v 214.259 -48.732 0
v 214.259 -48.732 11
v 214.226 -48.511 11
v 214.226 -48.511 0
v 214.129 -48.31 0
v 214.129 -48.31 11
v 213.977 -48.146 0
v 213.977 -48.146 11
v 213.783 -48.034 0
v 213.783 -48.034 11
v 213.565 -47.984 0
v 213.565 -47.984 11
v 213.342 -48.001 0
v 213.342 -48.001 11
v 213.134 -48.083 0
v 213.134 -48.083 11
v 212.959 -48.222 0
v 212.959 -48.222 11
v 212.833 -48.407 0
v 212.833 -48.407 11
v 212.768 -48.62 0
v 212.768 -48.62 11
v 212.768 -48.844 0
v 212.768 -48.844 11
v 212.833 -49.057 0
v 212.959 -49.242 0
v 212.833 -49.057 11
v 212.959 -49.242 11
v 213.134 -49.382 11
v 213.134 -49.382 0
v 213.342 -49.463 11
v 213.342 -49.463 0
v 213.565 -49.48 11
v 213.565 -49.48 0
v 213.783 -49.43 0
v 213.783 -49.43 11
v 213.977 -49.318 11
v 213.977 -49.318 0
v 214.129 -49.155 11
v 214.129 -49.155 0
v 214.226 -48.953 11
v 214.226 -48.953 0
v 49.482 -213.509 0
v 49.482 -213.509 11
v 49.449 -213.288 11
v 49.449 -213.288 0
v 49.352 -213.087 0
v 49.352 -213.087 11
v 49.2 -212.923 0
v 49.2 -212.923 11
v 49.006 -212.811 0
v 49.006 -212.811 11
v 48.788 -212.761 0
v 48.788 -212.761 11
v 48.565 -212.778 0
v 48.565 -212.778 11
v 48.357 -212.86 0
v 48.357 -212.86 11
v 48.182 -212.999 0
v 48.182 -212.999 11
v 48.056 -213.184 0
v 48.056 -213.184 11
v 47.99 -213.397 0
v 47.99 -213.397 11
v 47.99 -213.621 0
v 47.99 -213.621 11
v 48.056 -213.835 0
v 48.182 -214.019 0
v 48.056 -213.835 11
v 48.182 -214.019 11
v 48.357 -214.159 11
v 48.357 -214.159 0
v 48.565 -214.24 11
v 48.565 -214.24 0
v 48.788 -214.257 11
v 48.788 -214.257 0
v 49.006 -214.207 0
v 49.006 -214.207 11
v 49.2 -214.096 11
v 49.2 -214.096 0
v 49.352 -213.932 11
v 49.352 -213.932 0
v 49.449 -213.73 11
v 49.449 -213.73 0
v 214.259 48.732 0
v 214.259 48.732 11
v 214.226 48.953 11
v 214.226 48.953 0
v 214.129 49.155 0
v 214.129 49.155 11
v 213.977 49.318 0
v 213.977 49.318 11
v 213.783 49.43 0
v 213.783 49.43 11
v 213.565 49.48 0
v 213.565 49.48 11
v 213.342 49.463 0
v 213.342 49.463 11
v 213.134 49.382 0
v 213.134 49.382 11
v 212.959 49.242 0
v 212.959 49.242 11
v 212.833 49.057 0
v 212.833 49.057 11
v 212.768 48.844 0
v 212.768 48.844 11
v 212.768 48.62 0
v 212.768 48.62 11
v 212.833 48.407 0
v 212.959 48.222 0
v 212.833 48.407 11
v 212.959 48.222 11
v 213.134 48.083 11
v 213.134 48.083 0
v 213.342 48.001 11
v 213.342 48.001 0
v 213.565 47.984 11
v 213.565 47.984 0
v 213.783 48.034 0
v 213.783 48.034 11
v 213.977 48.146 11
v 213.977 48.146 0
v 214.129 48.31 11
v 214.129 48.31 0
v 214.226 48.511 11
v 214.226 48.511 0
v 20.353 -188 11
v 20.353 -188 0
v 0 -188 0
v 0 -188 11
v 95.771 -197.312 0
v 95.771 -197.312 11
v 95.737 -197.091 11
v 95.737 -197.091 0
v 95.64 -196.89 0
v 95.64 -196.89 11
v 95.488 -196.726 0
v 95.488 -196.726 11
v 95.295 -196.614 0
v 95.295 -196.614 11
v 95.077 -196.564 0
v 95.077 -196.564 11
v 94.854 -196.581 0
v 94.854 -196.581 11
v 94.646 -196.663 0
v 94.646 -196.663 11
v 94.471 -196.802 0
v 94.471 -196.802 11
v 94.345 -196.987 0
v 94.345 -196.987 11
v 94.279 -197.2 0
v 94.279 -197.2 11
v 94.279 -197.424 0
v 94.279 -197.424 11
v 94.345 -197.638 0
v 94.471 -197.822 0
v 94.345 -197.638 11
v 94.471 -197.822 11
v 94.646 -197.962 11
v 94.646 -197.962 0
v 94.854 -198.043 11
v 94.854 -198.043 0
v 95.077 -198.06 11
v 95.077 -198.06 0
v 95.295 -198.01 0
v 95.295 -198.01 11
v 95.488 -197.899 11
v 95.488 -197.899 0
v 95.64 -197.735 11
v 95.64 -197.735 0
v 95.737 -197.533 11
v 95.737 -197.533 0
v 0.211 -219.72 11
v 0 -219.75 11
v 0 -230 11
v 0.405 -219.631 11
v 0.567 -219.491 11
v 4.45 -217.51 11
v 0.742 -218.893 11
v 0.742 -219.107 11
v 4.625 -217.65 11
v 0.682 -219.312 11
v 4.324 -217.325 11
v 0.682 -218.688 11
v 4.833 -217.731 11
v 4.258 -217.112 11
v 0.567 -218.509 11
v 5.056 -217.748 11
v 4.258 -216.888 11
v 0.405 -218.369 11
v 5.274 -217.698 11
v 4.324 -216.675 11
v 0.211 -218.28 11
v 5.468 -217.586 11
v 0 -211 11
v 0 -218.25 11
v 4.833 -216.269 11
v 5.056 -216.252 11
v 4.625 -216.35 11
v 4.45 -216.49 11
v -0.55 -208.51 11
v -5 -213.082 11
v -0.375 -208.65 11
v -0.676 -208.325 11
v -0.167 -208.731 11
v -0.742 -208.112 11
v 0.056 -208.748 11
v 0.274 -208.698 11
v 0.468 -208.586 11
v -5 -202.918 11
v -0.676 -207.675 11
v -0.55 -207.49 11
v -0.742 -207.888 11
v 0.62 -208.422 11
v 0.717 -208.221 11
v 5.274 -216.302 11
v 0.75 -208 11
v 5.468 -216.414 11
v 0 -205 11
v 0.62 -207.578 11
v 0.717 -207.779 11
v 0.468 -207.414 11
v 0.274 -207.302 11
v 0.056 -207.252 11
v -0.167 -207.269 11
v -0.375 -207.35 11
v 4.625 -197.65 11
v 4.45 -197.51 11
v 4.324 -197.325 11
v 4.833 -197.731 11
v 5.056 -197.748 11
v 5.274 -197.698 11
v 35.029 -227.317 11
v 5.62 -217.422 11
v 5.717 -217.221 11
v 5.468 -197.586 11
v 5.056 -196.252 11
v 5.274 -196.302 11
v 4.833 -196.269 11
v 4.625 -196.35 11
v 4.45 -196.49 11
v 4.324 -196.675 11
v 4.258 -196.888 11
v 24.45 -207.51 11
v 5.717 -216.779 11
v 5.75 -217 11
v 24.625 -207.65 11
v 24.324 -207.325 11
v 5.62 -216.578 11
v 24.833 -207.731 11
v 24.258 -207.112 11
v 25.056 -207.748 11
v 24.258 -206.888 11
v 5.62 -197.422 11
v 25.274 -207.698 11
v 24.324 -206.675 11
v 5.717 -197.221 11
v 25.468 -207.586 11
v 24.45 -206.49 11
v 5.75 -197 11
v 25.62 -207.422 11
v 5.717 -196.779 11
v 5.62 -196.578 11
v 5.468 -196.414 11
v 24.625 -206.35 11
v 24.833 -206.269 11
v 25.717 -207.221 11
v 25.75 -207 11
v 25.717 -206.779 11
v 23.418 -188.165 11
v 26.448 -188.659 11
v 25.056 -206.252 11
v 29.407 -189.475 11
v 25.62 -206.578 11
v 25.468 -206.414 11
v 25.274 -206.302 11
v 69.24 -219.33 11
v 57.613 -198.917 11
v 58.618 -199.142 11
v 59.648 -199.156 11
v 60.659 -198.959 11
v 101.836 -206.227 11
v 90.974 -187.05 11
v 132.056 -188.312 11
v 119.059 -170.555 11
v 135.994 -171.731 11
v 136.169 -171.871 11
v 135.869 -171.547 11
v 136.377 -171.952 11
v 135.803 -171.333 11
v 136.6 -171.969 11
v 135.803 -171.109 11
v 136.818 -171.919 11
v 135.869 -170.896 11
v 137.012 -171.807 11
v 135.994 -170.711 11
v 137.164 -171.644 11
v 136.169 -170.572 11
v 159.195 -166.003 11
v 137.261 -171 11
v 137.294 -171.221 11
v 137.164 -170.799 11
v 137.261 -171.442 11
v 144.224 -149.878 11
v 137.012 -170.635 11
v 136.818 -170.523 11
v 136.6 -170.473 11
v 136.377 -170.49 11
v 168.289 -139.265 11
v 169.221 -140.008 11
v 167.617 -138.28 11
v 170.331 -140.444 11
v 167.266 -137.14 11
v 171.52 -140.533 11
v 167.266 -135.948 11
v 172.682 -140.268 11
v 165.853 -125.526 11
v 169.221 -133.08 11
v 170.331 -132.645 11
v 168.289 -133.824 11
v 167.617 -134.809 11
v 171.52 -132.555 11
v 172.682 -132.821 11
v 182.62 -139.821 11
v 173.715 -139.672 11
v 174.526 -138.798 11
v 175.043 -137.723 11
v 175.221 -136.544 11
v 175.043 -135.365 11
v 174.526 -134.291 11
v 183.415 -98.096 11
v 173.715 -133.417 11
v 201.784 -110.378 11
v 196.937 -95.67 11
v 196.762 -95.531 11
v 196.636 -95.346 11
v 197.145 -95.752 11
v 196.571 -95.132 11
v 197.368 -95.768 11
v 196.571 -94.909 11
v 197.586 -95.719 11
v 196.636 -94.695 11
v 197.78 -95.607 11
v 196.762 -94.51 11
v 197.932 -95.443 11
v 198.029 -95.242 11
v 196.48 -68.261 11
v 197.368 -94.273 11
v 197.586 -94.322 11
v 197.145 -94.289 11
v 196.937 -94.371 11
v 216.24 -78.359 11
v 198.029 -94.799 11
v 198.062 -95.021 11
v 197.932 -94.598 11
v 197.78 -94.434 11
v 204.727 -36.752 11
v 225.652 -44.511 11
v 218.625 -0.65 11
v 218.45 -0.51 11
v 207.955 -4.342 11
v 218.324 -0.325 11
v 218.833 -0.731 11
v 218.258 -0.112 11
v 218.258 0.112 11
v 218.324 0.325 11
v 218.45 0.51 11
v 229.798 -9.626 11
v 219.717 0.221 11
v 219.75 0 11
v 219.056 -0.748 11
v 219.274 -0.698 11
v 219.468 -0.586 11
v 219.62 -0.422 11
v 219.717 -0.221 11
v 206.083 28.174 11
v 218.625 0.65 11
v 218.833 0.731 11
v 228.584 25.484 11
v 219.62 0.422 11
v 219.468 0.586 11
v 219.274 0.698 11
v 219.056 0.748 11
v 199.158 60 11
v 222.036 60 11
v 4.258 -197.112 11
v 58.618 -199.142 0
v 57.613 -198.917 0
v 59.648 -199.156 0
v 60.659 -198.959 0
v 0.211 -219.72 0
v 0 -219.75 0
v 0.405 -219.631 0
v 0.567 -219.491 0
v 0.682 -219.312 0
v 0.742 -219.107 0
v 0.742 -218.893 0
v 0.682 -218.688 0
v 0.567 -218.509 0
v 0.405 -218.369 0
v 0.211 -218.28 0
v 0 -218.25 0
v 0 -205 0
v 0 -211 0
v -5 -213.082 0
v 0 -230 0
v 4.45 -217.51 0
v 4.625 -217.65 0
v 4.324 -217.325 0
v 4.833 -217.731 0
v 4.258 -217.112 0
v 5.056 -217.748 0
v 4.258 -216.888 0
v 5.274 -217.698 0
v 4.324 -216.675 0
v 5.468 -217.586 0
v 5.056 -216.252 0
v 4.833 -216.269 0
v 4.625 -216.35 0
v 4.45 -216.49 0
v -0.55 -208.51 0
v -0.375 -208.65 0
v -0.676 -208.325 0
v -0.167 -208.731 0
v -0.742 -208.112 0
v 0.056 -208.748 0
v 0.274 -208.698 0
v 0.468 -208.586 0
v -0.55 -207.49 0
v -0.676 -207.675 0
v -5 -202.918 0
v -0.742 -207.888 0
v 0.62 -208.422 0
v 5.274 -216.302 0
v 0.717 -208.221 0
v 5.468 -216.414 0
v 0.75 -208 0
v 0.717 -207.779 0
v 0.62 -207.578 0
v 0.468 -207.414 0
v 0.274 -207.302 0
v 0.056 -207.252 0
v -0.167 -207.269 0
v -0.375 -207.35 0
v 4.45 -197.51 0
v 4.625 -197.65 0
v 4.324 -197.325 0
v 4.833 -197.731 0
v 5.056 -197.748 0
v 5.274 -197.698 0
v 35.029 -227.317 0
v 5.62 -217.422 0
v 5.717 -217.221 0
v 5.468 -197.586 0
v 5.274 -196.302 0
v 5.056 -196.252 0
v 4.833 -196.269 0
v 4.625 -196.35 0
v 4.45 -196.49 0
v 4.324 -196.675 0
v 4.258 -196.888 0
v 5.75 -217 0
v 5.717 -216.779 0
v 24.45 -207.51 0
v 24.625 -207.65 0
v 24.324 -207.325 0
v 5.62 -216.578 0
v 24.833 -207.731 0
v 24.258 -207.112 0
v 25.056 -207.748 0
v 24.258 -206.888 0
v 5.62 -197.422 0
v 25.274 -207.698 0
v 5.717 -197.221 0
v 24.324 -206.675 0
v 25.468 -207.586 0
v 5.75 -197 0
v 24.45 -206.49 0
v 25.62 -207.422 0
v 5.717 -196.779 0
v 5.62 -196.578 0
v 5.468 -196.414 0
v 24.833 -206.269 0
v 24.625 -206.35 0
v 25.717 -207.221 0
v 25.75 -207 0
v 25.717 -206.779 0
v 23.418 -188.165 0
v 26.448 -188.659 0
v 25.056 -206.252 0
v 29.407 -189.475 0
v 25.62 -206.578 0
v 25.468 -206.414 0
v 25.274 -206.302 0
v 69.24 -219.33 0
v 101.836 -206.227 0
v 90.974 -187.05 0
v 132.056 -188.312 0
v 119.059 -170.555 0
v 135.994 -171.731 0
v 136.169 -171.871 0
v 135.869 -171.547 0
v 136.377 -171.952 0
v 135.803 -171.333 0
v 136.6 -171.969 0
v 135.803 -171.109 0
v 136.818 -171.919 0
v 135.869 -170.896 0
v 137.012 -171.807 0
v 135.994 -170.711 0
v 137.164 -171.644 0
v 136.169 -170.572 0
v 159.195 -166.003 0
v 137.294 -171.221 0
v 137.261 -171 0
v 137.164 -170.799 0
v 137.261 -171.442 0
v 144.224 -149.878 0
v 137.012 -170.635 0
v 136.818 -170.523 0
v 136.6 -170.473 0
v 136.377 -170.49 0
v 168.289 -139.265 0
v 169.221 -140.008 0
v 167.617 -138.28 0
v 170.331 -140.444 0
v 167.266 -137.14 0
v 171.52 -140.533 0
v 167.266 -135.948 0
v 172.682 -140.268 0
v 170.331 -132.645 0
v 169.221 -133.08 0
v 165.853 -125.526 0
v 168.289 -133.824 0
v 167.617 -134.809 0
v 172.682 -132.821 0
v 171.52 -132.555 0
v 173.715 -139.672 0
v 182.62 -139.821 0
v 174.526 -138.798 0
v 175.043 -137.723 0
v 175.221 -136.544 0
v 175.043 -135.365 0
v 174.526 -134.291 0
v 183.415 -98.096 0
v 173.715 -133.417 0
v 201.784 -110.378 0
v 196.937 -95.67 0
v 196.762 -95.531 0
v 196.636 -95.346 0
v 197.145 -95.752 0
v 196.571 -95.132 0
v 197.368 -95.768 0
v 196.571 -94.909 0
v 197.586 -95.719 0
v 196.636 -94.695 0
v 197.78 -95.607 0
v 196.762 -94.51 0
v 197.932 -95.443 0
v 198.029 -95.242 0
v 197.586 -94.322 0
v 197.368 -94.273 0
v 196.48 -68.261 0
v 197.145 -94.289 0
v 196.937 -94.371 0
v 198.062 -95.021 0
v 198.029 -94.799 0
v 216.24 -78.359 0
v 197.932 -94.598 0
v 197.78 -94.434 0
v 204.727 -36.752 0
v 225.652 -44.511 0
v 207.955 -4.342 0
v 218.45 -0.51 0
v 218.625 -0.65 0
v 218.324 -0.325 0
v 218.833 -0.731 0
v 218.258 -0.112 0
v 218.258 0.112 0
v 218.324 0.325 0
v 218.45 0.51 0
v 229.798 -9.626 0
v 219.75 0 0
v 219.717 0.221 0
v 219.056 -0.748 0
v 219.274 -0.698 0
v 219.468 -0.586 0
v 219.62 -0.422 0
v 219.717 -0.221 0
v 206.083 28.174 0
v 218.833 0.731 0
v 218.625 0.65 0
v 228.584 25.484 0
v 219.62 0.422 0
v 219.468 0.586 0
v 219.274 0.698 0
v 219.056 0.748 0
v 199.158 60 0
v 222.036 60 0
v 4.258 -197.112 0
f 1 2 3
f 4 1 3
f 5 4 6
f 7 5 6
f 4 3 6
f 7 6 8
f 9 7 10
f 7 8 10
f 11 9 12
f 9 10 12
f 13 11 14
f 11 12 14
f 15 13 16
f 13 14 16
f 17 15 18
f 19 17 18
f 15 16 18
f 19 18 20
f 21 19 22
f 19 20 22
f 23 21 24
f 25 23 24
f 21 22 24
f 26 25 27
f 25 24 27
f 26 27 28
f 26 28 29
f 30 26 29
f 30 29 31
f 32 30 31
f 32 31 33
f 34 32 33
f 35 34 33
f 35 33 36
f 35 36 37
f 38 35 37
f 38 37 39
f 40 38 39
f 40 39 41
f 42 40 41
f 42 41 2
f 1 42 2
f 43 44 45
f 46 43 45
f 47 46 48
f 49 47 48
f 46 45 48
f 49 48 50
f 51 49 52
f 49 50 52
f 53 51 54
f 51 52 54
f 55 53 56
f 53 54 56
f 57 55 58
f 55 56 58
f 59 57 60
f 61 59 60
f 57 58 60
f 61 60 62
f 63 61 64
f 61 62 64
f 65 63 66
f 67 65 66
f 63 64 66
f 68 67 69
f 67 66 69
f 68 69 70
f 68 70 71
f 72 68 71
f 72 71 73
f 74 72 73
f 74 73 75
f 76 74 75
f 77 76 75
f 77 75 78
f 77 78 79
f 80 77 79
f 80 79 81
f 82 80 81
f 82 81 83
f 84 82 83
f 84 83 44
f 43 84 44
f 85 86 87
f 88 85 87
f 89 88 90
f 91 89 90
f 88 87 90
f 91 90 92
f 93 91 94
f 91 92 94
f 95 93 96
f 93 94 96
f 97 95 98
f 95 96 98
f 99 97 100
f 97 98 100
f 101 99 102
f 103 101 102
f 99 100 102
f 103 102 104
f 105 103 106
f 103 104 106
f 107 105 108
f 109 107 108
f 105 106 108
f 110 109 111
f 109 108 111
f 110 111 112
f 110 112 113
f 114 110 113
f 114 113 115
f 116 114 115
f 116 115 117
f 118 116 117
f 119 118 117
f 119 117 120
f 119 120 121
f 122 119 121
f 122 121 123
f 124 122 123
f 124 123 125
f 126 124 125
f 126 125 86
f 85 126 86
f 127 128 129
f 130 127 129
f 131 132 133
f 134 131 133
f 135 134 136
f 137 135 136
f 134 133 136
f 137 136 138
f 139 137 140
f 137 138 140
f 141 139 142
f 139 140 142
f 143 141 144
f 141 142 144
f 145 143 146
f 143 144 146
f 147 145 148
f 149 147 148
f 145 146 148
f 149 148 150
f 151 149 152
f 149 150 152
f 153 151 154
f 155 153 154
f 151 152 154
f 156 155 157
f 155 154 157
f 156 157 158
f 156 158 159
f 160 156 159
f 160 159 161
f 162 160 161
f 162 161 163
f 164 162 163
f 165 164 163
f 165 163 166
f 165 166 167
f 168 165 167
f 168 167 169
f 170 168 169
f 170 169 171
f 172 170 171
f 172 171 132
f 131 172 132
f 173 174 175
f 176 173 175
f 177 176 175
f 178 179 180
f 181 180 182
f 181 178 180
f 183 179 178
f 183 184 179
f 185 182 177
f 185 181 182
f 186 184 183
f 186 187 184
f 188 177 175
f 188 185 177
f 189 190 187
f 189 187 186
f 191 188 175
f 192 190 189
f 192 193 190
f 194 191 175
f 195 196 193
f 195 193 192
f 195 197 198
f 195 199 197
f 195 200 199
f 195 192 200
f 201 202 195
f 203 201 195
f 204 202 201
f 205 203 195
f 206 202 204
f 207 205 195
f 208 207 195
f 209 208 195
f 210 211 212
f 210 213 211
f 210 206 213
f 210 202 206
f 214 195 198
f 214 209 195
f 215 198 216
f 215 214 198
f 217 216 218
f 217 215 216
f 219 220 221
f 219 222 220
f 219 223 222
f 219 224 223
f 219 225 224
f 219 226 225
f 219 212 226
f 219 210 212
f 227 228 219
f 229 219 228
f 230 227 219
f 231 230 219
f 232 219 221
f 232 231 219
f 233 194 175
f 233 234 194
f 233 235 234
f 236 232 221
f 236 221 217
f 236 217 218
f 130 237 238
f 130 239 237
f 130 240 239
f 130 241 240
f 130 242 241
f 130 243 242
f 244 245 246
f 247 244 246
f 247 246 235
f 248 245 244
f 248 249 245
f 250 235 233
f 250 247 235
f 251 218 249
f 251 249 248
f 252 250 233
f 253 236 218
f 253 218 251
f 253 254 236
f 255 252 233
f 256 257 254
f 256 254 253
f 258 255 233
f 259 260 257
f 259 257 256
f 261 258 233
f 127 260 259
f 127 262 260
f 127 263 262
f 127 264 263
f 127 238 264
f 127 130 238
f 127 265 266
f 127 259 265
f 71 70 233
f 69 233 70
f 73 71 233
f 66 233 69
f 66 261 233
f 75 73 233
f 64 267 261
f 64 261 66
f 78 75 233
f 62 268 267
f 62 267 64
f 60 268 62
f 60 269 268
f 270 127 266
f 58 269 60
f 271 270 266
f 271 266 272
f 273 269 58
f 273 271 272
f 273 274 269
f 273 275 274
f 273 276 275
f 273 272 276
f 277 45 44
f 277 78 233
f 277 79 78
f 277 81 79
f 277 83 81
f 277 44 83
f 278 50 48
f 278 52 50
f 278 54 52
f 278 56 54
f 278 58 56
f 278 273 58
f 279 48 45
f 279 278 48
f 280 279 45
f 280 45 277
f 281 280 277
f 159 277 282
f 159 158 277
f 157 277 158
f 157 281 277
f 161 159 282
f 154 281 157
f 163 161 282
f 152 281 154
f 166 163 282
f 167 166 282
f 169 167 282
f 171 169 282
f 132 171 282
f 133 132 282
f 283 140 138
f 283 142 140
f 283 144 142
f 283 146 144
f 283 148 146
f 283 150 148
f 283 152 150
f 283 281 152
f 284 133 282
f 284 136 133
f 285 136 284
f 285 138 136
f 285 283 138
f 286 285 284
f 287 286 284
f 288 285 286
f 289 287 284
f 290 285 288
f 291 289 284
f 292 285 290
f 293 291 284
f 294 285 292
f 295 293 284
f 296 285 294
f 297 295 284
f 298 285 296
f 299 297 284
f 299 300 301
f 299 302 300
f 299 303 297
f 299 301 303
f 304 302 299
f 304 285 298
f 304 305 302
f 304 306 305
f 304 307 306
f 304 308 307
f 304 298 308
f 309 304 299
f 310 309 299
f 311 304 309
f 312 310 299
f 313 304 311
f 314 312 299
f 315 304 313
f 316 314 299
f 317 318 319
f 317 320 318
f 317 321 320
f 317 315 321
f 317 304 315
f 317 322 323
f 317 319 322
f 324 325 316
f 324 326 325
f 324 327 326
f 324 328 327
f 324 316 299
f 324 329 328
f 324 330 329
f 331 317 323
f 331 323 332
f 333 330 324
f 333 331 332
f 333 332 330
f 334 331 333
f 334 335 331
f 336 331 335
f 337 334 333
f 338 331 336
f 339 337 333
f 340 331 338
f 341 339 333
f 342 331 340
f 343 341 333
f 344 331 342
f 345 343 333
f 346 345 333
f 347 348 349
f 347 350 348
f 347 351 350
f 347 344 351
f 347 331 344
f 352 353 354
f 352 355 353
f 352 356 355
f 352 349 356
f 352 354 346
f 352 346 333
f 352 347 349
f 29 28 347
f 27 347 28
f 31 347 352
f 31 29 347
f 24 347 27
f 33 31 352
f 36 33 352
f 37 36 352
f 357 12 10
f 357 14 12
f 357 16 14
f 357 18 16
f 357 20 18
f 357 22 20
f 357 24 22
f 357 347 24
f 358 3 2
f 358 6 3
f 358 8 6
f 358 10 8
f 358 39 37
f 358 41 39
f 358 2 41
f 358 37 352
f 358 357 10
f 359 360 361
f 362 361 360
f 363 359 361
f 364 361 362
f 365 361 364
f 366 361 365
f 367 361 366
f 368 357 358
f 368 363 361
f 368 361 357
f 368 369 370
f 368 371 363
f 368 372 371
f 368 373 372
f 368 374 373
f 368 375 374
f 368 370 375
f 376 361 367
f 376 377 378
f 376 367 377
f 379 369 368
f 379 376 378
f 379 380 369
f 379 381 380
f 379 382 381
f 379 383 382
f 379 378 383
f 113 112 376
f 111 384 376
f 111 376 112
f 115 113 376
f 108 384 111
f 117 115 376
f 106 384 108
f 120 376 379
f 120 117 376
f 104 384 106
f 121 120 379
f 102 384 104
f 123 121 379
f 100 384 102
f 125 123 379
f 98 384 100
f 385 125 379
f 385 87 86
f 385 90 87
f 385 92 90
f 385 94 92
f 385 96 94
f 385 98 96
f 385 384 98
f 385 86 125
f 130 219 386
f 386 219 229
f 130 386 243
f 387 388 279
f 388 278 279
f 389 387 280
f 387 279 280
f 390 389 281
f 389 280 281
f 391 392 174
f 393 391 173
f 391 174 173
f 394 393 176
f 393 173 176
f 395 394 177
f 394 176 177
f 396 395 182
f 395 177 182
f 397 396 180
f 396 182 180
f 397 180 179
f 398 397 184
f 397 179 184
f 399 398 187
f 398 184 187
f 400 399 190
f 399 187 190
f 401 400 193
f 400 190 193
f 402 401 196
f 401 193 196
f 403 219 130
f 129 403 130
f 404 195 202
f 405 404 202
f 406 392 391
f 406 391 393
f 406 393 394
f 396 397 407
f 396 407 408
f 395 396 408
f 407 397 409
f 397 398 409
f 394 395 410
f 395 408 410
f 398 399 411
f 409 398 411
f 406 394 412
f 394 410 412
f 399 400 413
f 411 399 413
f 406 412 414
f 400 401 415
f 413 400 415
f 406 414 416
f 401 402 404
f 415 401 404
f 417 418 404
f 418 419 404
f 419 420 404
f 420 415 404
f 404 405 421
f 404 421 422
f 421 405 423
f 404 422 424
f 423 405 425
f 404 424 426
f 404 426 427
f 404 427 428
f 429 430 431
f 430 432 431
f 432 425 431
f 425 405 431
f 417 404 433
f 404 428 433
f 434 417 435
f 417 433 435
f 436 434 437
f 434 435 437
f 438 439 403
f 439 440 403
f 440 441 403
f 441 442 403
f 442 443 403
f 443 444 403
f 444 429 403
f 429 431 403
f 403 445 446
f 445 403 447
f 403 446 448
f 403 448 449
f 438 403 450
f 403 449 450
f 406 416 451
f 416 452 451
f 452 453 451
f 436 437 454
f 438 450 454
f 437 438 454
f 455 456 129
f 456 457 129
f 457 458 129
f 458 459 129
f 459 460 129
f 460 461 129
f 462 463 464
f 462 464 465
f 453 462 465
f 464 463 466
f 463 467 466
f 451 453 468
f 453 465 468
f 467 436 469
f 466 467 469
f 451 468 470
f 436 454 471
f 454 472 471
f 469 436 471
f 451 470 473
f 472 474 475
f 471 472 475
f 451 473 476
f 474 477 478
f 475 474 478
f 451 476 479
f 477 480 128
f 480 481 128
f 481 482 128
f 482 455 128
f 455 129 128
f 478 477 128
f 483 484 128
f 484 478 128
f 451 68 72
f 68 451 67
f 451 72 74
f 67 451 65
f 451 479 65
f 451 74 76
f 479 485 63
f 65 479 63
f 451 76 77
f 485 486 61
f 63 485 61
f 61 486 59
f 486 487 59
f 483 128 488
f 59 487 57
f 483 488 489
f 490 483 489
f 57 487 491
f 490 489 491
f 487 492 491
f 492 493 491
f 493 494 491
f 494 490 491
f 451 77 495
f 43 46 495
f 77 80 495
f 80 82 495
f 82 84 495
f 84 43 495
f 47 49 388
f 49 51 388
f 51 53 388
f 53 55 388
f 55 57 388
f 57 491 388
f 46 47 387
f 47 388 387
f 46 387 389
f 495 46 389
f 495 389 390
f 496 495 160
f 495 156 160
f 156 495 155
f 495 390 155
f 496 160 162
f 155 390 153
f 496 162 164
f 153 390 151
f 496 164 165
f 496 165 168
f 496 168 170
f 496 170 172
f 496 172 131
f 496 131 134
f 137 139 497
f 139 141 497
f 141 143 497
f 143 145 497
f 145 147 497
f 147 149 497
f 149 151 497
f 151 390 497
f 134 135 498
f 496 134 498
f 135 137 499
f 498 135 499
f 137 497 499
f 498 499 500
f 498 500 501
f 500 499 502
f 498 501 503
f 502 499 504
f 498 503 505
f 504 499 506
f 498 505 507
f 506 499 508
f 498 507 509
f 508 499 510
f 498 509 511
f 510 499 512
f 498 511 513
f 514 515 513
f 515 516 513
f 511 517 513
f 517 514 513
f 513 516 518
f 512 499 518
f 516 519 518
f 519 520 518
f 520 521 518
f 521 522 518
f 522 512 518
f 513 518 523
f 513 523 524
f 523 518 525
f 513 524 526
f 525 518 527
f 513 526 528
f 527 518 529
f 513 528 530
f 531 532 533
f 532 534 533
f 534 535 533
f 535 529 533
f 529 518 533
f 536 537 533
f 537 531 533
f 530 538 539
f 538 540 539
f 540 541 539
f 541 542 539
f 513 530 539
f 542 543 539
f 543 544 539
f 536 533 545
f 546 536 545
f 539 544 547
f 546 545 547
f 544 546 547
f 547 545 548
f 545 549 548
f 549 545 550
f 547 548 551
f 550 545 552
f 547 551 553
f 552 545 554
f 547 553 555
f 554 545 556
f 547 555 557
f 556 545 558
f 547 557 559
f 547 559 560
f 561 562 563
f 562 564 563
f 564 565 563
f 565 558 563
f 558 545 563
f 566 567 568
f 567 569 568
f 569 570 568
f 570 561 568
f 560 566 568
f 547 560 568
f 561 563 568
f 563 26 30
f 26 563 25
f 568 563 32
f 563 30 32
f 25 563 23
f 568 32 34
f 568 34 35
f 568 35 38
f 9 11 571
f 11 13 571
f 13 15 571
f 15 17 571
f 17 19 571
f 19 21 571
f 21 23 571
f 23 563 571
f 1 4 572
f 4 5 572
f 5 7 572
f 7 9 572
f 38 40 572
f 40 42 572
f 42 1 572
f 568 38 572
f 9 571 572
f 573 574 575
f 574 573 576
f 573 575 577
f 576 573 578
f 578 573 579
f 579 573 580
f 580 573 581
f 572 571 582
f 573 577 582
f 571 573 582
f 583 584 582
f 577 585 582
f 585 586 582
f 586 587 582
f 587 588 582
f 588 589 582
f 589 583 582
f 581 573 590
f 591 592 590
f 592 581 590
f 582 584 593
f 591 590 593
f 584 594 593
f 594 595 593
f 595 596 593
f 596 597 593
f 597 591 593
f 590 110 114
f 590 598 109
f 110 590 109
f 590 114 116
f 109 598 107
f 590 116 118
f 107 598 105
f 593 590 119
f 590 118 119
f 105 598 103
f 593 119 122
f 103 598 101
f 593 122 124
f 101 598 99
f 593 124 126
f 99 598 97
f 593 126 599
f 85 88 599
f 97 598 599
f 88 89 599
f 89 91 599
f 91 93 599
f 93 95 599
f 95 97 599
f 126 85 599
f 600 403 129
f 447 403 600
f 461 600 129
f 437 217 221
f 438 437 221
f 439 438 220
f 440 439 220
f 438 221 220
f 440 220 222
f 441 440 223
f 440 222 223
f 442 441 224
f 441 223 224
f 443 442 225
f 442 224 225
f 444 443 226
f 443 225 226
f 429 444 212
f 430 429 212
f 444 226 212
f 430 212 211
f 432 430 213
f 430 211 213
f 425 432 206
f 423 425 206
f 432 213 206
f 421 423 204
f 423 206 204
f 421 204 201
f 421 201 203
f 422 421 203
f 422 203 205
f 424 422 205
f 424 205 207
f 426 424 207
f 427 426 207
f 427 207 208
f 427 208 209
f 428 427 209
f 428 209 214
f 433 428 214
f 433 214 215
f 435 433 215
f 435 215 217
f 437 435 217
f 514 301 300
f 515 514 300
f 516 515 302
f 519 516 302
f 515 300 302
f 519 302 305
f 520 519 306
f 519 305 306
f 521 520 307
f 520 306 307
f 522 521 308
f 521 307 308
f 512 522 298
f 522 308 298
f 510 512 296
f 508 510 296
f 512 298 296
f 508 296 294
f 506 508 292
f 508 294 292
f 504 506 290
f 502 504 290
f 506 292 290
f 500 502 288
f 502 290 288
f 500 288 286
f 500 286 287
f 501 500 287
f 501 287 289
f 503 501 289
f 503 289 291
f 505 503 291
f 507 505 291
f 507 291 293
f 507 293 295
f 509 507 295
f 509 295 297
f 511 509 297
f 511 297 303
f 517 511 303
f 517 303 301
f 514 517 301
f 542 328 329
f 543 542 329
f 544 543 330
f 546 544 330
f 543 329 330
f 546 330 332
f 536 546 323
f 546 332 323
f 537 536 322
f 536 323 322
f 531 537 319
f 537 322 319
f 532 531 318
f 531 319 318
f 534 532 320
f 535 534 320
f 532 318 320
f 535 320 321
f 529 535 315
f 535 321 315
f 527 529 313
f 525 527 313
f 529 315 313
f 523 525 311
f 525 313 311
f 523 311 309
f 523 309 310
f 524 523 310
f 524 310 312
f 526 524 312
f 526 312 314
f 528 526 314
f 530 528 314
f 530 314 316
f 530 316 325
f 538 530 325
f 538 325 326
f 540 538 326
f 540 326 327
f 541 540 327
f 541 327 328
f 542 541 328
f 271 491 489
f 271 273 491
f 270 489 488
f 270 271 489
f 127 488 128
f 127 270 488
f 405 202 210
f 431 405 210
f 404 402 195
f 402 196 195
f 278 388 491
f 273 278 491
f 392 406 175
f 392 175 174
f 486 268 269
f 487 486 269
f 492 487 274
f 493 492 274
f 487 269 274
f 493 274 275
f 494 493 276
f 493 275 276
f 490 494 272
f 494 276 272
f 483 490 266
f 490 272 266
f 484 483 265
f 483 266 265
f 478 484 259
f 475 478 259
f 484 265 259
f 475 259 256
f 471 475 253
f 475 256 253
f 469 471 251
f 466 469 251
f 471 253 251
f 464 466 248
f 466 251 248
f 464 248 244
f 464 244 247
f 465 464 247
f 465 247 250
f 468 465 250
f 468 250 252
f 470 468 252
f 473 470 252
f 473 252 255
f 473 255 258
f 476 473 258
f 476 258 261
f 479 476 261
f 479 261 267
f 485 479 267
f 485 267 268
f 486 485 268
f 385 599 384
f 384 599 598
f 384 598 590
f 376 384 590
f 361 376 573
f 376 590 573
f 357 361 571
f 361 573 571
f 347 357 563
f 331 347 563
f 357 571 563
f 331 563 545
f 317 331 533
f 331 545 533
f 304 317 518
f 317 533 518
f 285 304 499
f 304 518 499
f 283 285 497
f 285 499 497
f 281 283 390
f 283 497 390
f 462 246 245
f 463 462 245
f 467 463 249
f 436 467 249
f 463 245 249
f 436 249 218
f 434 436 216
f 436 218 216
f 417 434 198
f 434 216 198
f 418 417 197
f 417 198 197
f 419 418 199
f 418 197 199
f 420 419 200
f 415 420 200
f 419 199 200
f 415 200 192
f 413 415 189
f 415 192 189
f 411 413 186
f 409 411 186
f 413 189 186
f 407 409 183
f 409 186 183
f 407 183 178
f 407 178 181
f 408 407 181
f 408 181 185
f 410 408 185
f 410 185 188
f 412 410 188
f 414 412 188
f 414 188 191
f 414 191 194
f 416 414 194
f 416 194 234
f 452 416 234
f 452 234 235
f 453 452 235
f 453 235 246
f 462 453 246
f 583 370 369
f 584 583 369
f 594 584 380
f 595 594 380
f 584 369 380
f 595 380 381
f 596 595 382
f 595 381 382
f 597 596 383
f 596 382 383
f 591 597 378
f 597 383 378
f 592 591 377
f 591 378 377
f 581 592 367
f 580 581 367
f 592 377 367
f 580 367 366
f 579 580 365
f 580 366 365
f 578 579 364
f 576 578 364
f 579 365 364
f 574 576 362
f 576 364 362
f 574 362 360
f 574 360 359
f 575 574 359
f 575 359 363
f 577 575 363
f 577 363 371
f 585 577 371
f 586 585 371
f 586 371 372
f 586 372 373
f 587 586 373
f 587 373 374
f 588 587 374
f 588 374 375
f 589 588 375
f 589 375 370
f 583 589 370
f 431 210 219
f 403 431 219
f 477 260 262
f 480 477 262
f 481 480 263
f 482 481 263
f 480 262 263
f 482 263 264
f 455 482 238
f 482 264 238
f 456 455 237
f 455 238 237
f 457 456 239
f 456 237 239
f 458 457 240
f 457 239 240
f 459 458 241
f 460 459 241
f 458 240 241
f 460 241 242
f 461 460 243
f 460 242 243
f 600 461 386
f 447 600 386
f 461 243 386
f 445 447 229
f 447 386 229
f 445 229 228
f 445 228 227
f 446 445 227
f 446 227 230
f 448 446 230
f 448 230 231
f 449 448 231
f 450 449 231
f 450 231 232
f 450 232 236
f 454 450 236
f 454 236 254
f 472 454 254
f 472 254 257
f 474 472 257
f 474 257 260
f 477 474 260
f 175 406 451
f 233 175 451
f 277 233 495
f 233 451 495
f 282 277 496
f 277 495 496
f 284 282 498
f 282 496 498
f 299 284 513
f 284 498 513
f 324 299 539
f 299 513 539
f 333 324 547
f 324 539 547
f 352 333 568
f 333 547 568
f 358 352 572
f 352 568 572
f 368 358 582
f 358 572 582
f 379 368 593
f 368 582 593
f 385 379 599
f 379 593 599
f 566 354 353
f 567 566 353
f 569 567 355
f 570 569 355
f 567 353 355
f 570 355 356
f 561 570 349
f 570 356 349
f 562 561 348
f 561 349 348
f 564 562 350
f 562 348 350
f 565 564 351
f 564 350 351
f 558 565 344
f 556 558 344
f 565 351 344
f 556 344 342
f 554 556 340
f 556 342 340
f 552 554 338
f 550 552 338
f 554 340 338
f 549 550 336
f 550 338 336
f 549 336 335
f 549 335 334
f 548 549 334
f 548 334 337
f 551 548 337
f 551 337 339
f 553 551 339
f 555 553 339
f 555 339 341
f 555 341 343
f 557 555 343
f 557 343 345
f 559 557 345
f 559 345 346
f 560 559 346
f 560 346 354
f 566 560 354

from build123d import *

# Parameters (mm, degrees)
F1_DEPTH  = 11
F2_R      = 28.523991
F3_R      = 5
F5_R      = 0.75
F6_DEPTH  = 11.001
F7_R      = 4
F8_DEPTH  = 11.001
F10_DEPTH = 11.001


with BuildPart() as f1:
    # F0 (on Top) → F1 (new body)
    with BuildSketch(Plane.XY):
        with BuildLine():
            ThreePointArc((-59.119348, -199.42142), (-183.034682, -98.804378), (-199.158229, 60))
            Line((-199.158229, 60), (-222.036033, 60))
            ThreePointArc((-222.036033, 60), (0, -230), (222.036033, 60))
            Line((222.036033, 60), (199.158229, 60))
            ThreePointArc((199.158229, 60), (183.034682, -98.804378), (59.119348, -199.42142))
            Line((59.119348, -199.42142), (25, -188))
            Line((25, -188), (0, -188))
            Line((0, -188), (-25, -188))
            Line((-25, -188), (-59.119348, -199.42142))
        make_face()
    extrude(amount=F1_DEPTH)

    # F2
    f2_edges = [f1.edges().sort_by_distance(p)[0] for p in [
        (25, -188, 5.5),
        (-25, -188, 5.5),
    ]]
    fillet(f2_edges, radius=F2_R)

    # F3
    f3_edges = [f1.edges().sort_by_distance(p)[0] for p in [
        (59.119348, -199.42142, 5.5),
        (-59.119348, -199.42142, 5.5),
    ]]
    fillet(f3_edges, radius=F3_R)

    # F5 (on face) → F6 (cut, through all)
    with BuildSketch(Plane.XY.offset(11)):
        with Locations((0, -219)):
            Circle(F5_R)
        with Locations((48.732085, -213.509213)):
            Circle(F5_R)
        with Locations((95.020539, -197.312182)):
            Circle(F5_R)
        with Locations((136.544267, -171.221095)):
            Circle(F5_R)
        with Locations((171.221095, -136.544267)):
            Circle(F5_R)
        with Locations((197.312182, -95.020539)):
            Circle(F5_R)
        with Locations((213.509213, -48.732085)):
            Circle(F5_R)
        with Locations((219, 0)):
            Circle(F5_R)
        with Locations((213.509213, 48.732085)):
            Circle(F5_R)
        with Locations((197.312182, 95.020539)):
            Circle(F5_R)
        with Locations((171.221095, 136.544267)):
            Circle(F5_R)
        with Locations((136.544267, 171.221095)):
            Circle(F5_R)
        with Locations((95.020539, 197.312182)):
            Circle(F5_R)
        with Locations((48.732085, 213.509213)):
            Circle(F5_R)
        with Locations((0, 219)):
            Circle(F5_R)
        with Locations((-48.732085, 213.509213)):
            Circle(F5_R)
        with Locations((-95.020539, 197.312182)):
            Circle(F5_R)
        with Locations((-136.544267, 171.221095)):
            Circle(F5_R)
        with Locations((-171.221095, 136.544267)):
            Circle(F5_R)
        with Locations((-197.312182, 95.020539)):
            Circle(F5_R)
        with Locations((-213.509213, 48.732085)):
            Circle(F5_R)
        with Locations((-219, 0)):
            Circle(F5_R)
        with Locations((-213.509213, -48.732085)):
            Circle(F5_R)
        with Locations((-197.312182, -95.020539)):
            Circle(F5_R)
        with Locations((-171.221095, -136.544267)):
            Circle(F5_R)
        with Locations((-136.544267, -171.221095)):
            Circle(F5_R)
        with Locations((-95.020539, -197.312182)):
            Circle(F5_R)
        with Locations((-48.732085, -213.509213)):
            Circle(F5_R)
        with Locations((-5, -197)):
            Circle(F5_R)
        with Locations((5, -197)):
            Circle(F5_R)
        with Locations((0, -208)):
            Circle(F5_R)
        with Locations((-5, -217)):
            Circle(F5_R)
        with Locations((-25, -207)):
            Circle(F5_R)
        with Locations((5, -217)):
            Circle(F5_R)
        with Locations((25, -207)):
            Circle(F5_R)
    extrude(amount=-F6_DEPTH, mode=Mode.SUBTRACT)

    # F7 (on face) → F8 (cut, through all)
    with BuildSketch(Plane.XY.offset(11)):
        with Locations((-171.221095, -136.544267)):
            Circle(F7_R)
        with Locations((171.221095, -136.544267)):
            Circle(F7_R)
    extrude(amount=-F8_DEPTH, mode=Mode.SUBTRACT)

    # F9 (on face) → F10 (cut, through all)
    with BuildSketch(Plane.XY.offset(11)):
        Polygon((0, -205), (0, -188), (0, 106.196139), (-257.946059, 106.196139), (-257.946059, -251.474887), (0, -251.474887), (0, -211), (-5, -213.082092), (-5, -202.917908), align=None)
    extrude(amount=-F10_DEPTH, mode=Mode.SUBTRACT)


solid = f1.part
